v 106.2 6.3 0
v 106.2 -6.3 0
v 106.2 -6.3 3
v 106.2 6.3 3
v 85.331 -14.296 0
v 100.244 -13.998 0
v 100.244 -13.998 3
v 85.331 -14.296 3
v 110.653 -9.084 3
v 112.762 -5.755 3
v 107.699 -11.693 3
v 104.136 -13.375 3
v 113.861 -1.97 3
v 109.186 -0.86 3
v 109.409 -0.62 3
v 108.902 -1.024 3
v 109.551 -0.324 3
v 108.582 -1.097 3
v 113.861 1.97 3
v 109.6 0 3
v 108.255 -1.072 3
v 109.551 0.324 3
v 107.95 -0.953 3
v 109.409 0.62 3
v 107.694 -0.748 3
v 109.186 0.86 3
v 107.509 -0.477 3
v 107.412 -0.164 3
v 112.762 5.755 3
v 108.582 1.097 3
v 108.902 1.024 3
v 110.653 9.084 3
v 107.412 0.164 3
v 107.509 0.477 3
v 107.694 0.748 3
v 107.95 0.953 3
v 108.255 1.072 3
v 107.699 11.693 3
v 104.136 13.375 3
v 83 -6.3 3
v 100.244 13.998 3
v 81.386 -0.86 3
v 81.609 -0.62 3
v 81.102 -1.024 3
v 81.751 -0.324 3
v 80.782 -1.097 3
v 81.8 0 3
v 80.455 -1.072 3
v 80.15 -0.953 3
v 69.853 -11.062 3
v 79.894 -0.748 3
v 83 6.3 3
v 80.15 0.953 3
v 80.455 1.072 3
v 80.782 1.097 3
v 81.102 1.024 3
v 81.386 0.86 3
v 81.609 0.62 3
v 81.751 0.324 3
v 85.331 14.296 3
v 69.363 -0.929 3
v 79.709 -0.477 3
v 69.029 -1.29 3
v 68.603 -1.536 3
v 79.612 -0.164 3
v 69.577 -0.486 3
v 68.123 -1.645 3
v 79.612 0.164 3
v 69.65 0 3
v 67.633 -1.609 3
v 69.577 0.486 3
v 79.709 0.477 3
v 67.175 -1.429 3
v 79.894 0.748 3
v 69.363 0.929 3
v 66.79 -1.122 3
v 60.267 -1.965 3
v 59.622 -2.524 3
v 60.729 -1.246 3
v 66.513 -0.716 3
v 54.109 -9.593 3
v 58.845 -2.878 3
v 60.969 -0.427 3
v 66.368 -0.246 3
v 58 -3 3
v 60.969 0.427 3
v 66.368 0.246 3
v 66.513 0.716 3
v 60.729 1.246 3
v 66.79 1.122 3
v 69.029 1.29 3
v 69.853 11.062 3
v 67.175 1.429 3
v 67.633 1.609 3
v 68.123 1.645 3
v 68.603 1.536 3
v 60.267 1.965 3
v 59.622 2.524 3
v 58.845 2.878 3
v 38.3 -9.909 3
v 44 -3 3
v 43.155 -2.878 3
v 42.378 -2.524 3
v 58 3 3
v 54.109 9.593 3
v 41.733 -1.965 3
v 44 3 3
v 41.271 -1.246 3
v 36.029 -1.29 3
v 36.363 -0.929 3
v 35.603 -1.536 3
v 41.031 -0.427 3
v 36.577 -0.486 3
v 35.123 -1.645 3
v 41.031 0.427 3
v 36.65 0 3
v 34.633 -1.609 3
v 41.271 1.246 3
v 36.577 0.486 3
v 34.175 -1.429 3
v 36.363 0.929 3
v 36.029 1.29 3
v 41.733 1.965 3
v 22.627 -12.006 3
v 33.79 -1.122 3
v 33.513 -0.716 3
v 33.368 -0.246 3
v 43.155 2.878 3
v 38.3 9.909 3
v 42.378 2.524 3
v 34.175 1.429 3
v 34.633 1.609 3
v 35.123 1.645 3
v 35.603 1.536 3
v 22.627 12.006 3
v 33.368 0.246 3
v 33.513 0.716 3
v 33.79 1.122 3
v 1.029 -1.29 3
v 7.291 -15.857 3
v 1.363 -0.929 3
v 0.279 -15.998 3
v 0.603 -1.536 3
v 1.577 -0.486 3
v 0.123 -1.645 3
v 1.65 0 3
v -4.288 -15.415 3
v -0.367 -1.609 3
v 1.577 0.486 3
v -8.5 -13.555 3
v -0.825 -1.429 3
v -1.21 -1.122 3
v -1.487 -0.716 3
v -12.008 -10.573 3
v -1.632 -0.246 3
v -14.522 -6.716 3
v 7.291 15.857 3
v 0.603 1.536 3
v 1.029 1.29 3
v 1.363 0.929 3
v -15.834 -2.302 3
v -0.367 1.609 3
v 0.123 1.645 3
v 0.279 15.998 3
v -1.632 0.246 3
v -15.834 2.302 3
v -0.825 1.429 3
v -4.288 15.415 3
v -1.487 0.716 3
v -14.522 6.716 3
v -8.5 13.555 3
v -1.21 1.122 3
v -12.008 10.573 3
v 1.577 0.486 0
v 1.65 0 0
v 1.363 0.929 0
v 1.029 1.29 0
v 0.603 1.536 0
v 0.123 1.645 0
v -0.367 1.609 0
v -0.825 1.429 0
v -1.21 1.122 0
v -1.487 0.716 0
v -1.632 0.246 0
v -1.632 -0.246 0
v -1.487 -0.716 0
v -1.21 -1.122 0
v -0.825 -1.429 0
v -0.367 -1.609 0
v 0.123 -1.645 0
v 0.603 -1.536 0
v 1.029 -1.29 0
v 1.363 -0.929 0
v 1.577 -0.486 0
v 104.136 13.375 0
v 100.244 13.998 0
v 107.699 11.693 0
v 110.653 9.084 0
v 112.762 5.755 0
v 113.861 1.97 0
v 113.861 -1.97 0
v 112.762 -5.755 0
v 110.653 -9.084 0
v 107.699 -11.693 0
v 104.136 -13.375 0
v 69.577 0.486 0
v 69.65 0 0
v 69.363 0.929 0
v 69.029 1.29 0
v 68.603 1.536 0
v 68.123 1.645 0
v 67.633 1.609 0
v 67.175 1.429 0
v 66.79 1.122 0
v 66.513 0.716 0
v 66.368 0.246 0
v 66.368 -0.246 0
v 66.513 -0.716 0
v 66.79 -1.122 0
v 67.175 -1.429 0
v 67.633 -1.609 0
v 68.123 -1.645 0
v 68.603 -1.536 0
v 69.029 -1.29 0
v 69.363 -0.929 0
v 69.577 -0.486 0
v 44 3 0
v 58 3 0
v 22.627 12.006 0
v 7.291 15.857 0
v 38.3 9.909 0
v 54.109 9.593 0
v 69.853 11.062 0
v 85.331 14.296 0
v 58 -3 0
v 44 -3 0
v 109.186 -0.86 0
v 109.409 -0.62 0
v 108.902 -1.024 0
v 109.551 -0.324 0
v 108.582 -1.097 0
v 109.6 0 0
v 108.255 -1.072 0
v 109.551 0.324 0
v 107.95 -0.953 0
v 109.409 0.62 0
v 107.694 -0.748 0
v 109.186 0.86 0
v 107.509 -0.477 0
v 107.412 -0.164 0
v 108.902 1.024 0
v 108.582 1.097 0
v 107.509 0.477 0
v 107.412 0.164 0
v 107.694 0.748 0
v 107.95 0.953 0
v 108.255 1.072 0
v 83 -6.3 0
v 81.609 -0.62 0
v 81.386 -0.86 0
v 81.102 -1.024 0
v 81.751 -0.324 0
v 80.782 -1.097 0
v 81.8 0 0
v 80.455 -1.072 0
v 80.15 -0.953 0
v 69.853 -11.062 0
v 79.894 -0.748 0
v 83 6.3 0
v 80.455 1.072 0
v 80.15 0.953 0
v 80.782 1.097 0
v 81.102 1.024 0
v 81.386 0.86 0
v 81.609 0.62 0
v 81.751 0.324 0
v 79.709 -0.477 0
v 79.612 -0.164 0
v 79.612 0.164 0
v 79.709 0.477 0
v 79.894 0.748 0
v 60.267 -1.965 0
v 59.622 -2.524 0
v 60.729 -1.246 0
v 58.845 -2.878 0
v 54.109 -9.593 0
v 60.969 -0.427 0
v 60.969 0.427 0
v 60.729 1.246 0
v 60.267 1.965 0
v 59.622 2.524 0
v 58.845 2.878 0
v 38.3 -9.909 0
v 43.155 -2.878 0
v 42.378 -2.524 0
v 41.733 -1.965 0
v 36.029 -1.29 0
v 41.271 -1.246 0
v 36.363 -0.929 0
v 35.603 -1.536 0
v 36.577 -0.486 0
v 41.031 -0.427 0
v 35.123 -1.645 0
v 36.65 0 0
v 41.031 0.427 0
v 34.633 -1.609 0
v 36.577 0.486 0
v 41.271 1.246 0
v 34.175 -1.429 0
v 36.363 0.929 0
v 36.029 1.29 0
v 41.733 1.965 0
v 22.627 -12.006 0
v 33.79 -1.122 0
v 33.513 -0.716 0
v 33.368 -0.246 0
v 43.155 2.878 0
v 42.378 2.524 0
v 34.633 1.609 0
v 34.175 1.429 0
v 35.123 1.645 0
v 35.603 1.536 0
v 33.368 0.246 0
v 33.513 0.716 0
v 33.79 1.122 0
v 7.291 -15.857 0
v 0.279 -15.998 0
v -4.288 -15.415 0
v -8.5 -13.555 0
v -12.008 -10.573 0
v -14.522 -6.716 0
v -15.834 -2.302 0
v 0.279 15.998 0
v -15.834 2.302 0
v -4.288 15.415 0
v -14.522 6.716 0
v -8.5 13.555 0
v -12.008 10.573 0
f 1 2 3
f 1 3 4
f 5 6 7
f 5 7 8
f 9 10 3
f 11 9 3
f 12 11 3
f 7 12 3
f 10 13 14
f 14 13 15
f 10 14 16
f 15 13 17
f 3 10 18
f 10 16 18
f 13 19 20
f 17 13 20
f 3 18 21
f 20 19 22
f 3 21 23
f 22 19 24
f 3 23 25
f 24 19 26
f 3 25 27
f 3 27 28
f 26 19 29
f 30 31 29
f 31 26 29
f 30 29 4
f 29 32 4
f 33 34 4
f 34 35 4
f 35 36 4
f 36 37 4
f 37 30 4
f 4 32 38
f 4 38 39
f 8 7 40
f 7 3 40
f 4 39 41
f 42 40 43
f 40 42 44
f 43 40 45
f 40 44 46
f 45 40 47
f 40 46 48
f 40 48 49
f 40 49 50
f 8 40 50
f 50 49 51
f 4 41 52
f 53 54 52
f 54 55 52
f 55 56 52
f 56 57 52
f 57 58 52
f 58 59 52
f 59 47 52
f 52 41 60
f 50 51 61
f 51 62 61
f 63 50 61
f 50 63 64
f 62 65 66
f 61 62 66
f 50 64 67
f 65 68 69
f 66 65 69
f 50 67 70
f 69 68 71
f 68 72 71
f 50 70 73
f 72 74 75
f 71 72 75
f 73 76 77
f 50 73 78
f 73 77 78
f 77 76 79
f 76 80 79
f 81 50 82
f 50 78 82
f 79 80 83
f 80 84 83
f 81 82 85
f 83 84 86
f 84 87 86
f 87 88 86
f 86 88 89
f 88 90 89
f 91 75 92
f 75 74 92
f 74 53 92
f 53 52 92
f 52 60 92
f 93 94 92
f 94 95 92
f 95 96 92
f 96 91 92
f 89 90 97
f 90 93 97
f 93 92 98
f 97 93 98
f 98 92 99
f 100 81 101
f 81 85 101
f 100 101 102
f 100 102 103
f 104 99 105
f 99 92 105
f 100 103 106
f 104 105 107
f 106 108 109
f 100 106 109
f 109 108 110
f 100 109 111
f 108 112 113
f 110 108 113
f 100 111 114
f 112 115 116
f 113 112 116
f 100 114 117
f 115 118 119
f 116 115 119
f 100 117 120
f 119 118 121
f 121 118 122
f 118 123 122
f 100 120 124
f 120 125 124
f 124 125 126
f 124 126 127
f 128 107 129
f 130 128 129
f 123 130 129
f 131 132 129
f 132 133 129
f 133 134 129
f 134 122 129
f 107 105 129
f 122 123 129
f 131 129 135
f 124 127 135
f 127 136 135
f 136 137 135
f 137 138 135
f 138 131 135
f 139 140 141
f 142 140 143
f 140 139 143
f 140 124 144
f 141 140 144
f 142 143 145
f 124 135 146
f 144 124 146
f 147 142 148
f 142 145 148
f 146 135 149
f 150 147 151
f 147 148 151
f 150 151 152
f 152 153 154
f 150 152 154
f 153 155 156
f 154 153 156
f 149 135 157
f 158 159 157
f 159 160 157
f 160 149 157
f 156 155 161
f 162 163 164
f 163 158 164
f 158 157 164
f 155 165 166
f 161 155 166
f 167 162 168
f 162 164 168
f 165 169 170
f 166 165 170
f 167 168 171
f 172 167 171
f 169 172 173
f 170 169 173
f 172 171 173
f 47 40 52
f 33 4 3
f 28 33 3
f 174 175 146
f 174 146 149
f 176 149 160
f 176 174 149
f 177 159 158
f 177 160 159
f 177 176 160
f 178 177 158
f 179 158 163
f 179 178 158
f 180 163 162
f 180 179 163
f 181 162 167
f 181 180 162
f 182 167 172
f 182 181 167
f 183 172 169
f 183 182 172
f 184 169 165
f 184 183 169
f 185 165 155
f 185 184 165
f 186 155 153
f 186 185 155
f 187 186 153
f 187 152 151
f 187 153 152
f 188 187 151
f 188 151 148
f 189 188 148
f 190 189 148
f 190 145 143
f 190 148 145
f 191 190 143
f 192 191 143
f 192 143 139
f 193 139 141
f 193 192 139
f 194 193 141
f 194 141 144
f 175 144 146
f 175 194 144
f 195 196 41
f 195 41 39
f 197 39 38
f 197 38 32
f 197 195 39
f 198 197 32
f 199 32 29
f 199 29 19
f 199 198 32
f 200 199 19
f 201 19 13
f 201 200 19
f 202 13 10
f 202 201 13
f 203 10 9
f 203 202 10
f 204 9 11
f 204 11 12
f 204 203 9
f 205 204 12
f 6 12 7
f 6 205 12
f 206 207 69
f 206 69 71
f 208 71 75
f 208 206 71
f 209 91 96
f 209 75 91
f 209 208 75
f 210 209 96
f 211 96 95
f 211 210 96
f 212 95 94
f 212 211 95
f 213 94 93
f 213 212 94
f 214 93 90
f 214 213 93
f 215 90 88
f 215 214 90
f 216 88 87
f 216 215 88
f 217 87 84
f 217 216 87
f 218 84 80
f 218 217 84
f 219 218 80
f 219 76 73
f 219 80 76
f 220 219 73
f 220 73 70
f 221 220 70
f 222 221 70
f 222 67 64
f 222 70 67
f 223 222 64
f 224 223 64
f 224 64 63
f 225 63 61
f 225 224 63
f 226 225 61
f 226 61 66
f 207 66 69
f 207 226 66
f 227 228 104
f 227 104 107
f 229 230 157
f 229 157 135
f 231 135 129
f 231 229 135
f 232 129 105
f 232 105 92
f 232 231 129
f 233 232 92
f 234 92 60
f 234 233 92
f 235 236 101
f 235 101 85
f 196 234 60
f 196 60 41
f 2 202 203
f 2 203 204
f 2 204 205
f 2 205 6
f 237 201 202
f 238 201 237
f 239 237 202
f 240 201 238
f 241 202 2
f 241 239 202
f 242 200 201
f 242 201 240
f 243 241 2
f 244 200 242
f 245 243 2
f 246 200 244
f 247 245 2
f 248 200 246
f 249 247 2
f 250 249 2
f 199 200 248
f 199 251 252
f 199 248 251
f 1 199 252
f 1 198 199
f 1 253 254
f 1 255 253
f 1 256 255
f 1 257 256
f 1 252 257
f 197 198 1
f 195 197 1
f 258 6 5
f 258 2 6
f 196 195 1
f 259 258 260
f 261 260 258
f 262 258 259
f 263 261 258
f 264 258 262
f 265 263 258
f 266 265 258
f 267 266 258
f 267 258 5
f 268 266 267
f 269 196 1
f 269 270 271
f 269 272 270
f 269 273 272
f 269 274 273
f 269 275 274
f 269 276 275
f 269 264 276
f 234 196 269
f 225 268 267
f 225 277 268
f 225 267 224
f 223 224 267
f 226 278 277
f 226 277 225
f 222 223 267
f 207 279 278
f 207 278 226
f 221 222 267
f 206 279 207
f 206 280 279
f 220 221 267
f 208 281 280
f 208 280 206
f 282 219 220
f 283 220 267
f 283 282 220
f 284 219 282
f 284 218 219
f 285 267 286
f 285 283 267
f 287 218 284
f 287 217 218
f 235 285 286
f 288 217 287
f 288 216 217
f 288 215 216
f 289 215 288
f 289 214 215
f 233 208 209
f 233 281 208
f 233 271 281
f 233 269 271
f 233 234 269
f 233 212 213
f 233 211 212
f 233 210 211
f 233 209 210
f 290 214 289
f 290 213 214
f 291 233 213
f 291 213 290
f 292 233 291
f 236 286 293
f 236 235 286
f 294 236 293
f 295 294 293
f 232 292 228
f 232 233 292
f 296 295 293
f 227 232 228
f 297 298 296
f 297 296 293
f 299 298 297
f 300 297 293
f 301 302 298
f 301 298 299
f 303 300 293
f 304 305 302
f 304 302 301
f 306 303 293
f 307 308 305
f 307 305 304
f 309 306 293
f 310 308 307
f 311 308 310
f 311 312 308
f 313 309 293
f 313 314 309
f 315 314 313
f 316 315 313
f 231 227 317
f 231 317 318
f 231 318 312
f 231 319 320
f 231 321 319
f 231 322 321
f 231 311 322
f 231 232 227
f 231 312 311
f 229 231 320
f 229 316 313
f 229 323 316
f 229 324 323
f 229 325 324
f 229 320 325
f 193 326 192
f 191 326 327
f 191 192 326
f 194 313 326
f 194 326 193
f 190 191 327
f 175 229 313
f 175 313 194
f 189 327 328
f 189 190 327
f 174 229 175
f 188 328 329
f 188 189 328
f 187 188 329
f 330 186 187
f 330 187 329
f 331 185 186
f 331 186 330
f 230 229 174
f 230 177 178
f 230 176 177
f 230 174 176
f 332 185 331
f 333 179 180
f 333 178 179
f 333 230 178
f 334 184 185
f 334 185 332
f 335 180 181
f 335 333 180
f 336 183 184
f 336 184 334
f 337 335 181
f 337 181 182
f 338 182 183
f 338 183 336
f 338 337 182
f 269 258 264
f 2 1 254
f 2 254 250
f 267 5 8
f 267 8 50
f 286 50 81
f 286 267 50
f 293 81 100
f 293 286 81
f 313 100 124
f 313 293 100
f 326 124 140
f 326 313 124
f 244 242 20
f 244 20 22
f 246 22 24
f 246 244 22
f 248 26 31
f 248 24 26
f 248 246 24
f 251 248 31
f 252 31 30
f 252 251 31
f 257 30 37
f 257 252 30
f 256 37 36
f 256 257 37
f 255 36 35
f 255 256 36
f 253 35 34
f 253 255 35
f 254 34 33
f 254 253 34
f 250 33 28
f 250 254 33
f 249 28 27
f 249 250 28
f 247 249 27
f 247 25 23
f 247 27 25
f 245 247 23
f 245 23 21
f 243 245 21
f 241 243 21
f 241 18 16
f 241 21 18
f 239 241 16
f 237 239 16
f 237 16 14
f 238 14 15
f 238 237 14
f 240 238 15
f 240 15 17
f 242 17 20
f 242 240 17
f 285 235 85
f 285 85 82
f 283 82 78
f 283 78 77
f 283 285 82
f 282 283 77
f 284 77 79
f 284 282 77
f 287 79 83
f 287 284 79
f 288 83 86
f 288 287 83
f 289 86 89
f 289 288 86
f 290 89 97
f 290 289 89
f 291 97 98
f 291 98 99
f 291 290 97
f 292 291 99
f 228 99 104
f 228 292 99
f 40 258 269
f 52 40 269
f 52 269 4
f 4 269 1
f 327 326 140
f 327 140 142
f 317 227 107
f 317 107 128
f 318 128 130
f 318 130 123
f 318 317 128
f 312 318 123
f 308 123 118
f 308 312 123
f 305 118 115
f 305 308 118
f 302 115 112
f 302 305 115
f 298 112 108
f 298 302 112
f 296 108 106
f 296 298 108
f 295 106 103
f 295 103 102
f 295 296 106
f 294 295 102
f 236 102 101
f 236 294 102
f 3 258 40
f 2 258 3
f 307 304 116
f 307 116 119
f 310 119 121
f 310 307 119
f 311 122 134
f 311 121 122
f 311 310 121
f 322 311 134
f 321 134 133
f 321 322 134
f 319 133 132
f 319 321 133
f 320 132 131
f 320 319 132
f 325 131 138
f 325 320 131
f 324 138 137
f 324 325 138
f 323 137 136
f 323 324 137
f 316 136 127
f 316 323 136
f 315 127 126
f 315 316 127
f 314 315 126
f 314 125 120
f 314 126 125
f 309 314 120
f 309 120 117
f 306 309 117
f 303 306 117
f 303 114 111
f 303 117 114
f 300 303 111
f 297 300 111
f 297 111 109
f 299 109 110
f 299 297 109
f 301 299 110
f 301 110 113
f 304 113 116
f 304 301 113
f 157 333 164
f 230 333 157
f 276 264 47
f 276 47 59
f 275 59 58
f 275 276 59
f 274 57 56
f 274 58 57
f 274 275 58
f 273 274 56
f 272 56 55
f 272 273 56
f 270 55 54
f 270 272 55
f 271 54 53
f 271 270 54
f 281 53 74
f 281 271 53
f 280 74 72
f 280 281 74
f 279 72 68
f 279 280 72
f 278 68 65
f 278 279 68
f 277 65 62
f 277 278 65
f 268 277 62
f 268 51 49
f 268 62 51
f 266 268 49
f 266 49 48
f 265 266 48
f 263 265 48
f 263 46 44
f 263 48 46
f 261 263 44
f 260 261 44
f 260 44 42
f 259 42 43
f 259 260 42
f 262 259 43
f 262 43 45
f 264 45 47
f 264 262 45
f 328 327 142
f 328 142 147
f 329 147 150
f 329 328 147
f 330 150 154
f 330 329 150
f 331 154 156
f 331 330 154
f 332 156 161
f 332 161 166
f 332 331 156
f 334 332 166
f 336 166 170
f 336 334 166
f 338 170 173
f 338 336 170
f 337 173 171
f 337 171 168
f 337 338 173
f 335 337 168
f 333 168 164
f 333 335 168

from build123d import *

# Parameters (mm, degrees)
ESKIZ_KONTUR_W        = 23.2
ESKIZ_KONTUR_H        = 12.6
PLASTINA_DEPTH        = 3
OTVERSTIYA_DEPTH      = 116.156318141
OTVERSTIYA_DEPTH_BACK = 116.156318141
ESKIZ_OTVERSTIYA_R    = 1.65
ESKIZ_OTVERSTIYA_R_2  = 1.1


with BuildPart() as part:
    # Eskiz_kontur → Plastina (new body)
    with BuildSketch(Plane.XY):
        with BuildLine():
            Line((7.29115, -15.8573), (0.27924, -15.99756))
            ThreePointArc((0.27924, -15.99756), (-15.999996904, 0), (0.27924, 15.99756))
            Line((0.27924, 15.99756), (7.29115, 15.8573))
            ThreePointArc((7.29115, 15.8573), (46.200008227, 9.528004702), (85.330859965, 14.296198255))
            Line((85.330859965, 14.296198255), (100.244329965, 13.997868255))
            ThreePointArc((100.244329965, 13.997868255), (113.999902223, 0), (100.244329965, -13.997868255))
            Line((100.244329965, -13.997868255), (85.330859965, -14.296198255))
            ThreePointArc((85.330859965, -14.296198255), (46.200008227, -9.528004702), (7.29115, -15.8573))
        make_face()
        with BuildLine():
            Line((58, 3), (44, 3))
            ThreePointArc((44, 3), (41, 0), (44, -3))
            Line((44, -3), (58, -3))
            ThreePointArc((58, -3), (61, 0), (58, 3))
        make_face(mode=Mode.SUBTRACT)
        with Locations((94.6, 0)):
            Rectangle(ESKIZ_KONTUR_W, ESKIZ_KONTUR_H, mode=Mode.SUBTRACT)
    extrude(amount=PLASTINA_DEPTH)

    # Eskiz_otverstiya → Otverstiya (cut, two sides: drawn at the far end of the back side and taken through both)
    with BuildSketch(Plane.XY.offset(-OTVERSTIYA_DEPTH_BACK)):
        Circle(ESKIZ_OTVERSTIYA_R)
        with Locations((35, 0)):
            Circle(ESKIZ_OTVERSTIYA_R)
        with Locations((68, 0)):
            Circle(ESKIZ_OTVERSTIYA_R)
        with Locations((80.7, 0)):
            Circle(ESKIZ_OTVERSTIYA_R_2)
        with Locations((108.5, 0)):
            Circle(ESKIZ_OTVERSTIYA_R_2)
    extrude(amount=OTVERSTIYA_DEPTH + OTVERSTIYA_DEPTH_BACK, mode=Mode.SUBTRACT)


solid = part.part
